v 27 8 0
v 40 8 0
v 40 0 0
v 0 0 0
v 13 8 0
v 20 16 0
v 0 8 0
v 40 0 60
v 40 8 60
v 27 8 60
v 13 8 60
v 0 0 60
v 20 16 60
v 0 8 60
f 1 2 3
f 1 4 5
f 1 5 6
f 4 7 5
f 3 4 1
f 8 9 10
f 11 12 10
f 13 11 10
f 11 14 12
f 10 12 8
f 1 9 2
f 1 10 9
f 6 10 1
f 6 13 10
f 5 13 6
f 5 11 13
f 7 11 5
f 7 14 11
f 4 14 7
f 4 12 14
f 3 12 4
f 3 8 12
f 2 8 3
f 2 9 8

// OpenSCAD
$fn = 32;

// ----------------------------------------------------------------------
// V guide rail: vrib, 40 mm wide
// ----------------------------------------------------------------------

// --- parameters (mm) ---
rail_w = 40;              // rail width, X
base_t = 8;               // base plate thickness
v_depth = 8;              // V feature depth / height
v_half_w = 7;             // half width of the V at the base face
plate_t = 60;             // rail length, Z (the extrusion height)
fit_tol = 0.05;           // declared fit tolerance (prompt contract)
free_tol = 0.3;           // declared free tolerance (prompt contract)

profile = [[0, 0], [40, 0], [40, 8], [27, 8], [20, 16], [13, 8], [0, 8]];  // primary outline, 7 points, counter clockwise

// --- the one profile operation ---
linear_extrude(height = plate_t) polygon(points = profile);
